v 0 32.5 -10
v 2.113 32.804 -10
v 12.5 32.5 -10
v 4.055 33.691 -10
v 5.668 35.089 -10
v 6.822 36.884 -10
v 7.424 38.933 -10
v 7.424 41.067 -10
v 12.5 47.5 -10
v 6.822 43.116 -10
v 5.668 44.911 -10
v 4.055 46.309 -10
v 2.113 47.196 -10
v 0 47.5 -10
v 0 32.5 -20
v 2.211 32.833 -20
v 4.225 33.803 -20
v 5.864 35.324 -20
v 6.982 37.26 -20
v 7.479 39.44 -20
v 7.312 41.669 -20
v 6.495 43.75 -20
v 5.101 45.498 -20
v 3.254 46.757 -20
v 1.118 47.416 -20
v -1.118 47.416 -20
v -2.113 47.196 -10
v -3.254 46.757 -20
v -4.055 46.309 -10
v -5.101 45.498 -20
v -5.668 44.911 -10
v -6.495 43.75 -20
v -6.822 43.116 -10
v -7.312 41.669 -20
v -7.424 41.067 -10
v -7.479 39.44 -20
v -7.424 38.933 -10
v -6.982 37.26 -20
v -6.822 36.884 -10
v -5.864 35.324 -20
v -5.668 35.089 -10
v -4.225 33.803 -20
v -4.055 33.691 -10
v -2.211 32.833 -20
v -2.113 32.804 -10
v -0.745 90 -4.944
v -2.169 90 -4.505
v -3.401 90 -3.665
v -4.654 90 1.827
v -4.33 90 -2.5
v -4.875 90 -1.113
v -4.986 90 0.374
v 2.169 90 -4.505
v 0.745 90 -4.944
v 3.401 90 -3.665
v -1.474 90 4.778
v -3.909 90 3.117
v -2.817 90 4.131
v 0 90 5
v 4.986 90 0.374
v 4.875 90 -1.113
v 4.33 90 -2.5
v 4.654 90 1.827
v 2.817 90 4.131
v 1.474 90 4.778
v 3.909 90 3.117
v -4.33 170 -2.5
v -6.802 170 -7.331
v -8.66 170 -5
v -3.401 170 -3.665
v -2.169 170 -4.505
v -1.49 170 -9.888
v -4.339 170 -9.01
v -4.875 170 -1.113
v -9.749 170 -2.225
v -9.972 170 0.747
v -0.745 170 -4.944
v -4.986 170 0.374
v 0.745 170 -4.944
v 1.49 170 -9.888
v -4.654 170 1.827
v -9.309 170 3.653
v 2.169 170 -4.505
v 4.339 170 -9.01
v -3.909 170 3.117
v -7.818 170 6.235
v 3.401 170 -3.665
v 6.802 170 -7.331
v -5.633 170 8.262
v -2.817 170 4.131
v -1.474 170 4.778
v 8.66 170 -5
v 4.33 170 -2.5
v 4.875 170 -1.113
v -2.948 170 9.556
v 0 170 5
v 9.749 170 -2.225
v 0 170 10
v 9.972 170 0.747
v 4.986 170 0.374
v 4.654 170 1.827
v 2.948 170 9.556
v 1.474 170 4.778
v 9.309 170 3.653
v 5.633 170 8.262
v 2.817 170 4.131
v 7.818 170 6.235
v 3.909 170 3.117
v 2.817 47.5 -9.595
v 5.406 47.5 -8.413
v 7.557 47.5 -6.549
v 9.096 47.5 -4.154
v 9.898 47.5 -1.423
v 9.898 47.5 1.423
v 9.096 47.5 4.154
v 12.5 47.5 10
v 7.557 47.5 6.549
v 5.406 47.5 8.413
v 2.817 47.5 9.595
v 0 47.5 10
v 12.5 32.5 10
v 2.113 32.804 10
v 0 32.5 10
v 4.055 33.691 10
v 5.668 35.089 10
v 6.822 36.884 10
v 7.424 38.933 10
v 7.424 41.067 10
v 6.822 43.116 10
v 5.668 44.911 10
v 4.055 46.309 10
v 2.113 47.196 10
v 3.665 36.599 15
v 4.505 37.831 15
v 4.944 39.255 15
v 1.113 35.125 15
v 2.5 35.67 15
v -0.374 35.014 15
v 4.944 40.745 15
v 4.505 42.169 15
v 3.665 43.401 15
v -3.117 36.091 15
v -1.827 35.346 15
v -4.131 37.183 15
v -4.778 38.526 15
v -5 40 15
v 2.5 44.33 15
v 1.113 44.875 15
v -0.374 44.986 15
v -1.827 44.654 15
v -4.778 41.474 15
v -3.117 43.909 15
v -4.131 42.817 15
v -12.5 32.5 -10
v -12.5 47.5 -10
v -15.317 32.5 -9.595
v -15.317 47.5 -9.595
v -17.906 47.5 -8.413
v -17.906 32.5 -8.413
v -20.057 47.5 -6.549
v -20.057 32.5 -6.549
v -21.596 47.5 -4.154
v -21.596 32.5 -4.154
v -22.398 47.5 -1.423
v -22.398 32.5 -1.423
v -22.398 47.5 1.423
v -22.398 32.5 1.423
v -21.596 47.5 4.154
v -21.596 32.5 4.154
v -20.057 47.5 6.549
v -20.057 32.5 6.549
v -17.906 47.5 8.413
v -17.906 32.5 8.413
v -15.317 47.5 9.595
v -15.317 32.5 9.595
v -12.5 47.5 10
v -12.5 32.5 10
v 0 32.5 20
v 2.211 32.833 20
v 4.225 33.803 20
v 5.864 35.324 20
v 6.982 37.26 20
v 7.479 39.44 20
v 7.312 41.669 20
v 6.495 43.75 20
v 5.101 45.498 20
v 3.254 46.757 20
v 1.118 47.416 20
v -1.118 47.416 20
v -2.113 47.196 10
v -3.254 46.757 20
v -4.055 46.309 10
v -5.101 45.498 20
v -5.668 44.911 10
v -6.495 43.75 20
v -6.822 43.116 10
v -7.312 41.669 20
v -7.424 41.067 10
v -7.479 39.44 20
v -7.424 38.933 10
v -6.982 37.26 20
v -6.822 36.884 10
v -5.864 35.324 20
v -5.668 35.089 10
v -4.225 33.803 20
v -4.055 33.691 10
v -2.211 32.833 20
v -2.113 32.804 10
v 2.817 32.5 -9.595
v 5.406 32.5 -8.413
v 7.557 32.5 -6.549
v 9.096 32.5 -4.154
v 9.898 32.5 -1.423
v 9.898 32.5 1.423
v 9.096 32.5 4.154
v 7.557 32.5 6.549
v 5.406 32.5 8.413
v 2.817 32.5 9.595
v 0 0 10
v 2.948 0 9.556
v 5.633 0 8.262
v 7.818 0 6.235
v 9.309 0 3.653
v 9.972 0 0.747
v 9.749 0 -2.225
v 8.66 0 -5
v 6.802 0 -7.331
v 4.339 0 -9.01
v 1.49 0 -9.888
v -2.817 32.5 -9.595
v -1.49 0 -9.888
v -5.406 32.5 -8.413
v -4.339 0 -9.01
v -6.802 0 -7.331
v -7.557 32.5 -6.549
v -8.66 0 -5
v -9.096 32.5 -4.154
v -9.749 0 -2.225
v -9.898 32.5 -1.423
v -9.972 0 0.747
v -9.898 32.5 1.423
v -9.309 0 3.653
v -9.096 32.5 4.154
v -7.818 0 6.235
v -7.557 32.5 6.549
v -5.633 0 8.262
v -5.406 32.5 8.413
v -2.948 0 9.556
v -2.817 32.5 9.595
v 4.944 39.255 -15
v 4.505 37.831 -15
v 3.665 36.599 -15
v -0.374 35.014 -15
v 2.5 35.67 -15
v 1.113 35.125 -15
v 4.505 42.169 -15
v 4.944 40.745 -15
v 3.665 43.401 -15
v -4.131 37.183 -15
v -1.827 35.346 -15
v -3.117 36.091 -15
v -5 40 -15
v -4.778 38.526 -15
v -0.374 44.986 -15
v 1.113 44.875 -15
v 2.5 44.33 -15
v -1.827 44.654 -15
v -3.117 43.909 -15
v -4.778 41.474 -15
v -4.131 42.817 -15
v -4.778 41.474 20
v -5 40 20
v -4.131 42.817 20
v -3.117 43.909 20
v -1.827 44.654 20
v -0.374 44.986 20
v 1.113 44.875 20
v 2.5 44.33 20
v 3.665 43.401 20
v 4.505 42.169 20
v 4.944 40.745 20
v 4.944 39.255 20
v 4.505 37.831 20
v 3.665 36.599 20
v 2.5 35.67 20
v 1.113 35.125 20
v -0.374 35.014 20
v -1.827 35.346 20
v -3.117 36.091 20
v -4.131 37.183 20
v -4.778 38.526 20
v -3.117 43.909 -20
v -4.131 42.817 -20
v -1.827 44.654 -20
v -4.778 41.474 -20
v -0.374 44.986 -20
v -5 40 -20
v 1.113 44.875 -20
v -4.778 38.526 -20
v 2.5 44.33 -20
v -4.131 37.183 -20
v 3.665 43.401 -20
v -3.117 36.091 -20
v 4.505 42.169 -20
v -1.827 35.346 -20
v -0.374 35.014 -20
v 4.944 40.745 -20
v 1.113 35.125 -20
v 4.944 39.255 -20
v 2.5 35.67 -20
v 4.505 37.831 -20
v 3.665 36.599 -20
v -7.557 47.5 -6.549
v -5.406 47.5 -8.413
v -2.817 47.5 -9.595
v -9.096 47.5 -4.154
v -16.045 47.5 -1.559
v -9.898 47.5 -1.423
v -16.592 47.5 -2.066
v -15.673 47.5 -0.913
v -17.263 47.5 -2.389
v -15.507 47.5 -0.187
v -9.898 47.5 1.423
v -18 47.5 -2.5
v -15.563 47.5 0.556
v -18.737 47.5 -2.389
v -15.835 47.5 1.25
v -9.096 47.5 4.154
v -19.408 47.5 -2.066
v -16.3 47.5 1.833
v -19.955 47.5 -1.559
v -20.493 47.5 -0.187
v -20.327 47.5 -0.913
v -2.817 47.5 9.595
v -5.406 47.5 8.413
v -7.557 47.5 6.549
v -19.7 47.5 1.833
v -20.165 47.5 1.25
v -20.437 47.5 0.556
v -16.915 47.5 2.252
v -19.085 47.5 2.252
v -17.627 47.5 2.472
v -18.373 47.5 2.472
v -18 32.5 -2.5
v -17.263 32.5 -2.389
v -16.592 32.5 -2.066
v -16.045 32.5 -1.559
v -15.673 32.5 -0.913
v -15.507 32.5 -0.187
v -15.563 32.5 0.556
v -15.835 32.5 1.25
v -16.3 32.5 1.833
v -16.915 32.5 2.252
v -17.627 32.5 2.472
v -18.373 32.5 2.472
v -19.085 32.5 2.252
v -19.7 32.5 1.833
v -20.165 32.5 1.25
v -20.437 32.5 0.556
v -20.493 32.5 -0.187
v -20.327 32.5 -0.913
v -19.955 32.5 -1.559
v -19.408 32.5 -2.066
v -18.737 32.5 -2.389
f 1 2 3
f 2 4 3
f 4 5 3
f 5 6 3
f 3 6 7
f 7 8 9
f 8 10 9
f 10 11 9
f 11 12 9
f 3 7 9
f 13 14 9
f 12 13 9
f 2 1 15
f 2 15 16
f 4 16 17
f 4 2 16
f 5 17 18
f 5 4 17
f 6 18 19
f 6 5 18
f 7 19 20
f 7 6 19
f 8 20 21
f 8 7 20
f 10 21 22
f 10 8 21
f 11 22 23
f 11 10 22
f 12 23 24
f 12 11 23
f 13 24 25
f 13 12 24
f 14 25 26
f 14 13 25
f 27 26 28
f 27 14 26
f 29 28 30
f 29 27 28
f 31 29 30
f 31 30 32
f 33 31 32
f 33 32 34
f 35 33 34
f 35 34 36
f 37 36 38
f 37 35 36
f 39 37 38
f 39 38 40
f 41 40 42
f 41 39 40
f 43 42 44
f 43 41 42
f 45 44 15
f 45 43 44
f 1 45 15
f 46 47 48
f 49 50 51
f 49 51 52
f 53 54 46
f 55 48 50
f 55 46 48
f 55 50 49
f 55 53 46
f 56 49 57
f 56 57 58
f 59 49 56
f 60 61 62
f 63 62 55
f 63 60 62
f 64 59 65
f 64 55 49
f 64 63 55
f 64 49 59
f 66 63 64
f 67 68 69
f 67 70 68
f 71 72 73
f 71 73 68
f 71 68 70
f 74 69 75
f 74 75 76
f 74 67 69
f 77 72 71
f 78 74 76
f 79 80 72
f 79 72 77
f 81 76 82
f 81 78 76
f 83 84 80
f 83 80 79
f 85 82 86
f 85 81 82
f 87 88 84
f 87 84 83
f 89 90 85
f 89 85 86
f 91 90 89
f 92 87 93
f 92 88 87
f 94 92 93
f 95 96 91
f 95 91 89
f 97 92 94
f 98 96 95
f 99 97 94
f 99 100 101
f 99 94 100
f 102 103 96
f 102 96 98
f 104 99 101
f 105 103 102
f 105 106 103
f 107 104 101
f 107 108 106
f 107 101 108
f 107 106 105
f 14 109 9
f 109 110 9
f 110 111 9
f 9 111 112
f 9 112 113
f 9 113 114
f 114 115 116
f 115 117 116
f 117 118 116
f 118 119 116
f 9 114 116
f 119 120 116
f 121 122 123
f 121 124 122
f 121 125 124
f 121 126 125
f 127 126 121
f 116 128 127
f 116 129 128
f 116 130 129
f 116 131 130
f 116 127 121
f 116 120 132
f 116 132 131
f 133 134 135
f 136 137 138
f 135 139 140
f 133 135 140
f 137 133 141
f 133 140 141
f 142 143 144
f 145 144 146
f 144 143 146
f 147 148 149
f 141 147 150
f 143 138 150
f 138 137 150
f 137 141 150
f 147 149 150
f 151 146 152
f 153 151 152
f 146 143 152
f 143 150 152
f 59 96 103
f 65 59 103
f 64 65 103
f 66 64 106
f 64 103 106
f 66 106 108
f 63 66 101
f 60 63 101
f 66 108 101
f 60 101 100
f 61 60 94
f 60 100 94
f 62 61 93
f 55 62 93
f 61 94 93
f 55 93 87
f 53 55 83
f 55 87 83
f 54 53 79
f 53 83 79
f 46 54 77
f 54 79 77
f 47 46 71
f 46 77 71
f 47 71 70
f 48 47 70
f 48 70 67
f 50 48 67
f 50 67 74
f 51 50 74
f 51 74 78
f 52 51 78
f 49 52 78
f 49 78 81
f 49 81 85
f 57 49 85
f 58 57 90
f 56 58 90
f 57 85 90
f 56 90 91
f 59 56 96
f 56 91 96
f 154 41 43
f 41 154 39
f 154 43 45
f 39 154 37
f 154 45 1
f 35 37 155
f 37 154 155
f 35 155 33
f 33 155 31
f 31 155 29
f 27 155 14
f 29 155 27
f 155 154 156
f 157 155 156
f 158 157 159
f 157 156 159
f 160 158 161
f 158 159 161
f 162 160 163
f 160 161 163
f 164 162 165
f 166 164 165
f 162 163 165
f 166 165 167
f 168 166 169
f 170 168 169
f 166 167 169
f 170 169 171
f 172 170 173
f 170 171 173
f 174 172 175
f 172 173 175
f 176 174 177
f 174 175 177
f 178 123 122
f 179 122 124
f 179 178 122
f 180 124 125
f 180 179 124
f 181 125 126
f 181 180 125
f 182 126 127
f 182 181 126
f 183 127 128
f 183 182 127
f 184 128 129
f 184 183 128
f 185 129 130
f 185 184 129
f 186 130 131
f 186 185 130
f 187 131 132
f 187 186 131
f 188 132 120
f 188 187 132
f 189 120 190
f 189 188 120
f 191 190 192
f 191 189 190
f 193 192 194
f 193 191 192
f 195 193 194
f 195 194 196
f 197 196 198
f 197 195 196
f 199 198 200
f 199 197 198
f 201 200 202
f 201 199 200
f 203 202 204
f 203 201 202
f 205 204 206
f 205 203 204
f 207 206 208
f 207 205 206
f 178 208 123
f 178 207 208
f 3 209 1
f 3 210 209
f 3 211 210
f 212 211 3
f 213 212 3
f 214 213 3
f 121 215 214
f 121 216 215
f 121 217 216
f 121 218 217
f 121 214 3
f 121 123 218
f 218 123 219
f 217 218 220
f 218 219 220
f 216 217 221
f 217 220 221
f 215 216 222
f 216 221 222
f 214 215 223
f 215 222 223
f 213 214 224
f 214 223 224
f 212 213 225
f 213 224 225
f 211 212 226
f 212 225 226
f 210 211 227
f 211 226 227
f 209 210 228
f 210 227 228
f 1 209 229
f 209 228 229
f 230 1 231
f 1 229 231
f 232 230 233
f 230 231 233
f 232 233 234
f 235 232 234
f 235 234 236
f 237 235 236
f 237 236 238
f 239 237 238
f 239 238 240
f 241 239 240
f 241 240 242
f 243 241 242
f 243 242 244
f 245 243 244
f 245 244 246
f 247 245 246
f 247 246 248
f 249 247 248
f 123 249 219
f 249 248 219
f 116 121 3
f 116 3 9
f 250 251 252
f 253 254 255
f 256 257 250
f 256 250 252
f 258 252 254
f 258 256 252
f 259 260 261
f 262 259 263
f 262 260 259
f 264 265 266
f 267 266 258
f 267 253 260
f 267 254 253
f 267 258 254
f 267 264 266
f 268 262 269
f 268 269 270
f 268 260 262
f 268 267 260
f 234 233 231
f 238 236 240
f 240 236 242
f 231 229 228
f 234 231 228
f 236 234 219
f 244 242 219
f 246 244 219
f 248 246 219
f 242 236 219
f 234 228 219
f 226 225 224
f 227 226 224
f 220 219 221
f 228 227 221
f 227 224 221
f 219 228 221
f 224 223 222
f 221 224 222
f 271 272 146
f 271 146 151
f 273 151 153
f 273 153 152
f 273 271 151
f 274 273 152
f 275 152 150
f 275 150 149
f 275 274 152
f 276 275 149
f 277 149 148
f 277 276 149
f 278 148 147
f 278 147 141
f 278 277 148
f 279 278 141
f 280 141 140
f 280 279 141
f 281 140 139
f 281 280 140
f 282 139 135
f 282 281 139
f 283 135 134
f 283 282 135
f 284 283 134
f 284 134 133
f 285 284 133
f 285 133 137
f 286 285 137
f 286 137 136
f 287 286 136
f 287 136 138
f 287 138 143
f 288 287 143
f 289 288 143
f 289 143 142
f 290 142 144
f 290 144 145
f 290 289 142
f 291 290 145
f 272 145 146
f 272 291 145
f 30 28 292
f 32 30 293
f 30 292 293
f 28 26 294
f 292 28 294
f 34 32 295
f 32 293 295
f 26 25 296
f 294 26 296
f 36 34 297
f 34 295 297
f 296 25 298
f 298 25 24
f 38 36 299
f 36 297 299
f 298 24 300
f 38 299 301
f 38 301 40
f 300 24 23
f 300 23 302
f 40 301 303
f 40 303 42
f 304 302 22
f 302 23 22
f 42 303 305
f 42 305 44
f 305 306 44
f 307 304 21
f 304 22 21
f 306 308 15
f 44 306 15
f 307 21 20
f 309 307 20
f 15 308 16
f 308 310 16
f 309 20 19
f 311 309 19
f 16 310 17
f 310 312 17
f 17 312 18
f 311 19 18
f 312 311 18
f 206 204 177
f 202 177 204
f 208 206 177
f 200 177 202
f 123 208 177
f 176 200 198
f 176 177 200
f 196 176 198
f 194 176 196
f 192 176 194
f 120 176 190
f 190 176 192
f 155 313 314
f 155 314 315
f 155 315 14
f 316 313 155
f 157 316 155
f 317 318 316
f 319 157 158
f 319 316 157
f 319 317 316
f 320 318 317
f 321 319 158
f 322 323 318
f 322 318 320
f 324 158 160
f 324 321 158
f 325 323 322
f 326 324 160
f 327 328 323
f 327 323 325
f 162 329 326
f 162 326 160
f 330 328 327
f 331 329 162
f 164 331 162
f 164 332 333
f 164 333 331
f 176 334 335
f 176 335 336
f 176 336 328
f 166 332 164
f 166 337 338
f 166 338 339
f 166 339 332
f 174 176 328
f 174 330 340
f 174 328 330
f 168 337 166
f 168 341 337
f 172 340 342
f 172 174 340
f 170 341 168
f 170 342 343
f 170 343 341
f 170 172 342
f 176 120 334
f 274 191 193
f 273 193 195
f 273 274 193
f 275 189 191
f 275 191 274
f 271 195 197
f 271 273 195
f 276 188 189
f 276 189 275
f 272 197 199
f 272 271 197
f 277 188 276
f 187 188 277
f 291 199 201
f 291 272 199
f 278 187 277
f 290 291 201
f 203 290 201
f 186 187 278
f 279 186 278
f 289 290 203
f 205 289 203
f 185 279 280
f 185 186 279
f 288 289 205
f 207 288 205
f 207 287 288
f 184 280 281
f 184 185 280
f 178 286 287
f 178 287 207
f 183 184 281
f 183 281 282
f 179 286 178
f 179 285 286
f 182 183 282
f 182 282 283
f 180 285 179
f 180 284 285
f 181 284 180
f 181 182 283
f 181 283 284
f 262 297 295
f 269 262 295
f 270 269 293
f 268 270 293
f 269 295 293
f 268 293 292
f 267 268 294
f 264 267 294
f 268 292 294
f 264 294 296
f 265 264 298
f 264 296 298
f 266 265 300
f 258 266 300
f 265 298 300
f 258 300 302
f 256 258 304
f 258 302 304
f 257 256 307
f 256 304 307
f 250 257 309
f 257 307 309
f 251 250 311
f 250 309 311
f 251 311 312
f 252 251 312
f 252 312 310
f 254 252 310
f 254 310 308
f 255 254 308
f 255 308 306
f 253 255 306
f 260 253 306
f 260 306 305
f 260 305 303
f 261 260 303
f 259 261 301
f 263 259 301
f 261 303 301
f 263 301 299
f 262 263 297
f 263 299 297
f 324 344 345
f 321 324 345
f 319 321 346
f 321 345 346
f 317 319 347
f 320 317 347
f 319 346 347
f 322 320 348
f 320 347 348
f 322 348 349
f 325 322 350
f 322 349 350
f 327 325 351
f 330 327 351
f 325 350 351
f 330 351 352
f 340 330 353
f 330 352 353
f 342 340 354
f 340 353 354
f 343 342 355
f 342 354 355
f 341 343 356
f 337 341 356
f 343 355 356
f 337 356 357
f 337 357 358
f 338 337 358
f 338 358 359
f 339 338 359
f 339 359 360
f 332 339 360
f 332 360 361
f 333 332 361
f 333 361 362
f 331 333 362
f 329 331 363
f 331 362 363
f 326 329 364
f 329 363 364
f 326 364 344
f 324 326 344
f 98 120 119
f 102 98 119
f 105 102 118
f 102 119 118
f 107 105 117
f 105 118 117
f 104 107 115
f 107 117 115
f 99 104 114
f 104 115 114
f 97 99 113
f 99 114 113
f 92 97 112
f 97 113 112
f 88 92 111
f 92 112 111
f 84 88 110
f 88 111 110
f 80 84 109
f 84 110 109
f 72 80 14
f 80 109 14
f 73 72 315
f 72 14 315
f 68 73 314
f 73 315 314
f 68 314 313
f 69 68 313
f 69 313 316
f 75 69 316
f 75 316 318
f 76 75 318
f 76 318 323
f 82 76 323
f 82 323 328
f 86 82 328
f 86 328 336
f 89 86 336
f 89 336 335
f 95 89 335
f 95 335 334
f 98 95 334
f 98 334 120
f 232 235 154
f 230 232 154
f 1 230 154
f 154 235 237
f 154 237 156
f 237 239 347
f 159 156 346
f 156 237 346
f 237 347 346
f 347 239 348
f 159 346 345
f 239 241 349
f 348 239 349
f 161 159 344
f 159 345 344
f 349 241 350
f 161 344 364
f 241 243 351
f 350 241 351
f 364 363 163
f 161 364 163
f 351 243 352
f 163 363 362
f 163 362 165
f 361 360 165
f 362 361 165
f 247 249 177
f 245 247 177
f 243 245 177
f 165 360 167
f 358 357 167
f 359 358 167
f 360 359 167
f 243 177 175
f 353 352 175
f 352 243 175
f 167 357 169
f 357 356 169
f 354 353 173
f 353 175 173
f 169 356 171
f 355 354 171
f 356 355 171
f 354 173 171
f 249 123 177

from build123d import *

# Parameters (mm, degrees)
SKETCH1_R           = 10
BOSS_EXTRUDE1_DEPTH = 170
SKETCH2_W           = 25
SKETCH2_H           = 15
BOSS_EXTRUDE3_DEPTH = 10
BOSS_EXTRUDE4_START = -10
SKETCH3_R           = 7.5
BOSS_EXTRUDE4_DEPTH = 20
SKETCH4_R           = 5
CUT_EXTRUDE1_DEPTH  = 80
SKETCH5_R           = 5
CUT_EXTRUDE2_DEPTH  = 5
BOSS_EXTRUDE5_DEPTH = 15
SKETCH7_R           = 2.5
CUT_EXTRUDE3_DEPTH  = 15


with BuildPart() as part:
    # Sketch1 → Boss-Extrude1 (new body)
    with BuildSketch(Plane(origin=(0, 0, 0), x_dir=(1, 0, 0), z_dir=(0, 1, 0))):
        with Locations(Location((0, 0, 0), (0, 0, 270))):
            Circle(SKETCH1_R)
    extrude(amount=BOSS_EXTRUDE1_DEPTH)

    # Sketch2 → Boss-Extrude3 (add, symmetric)
    with BuildSketch(Plane.XY):
        with Locations((0, 40)):
            Rectangle(SKETCH2_W, SKETCH2_H)
    extrude(amount=BOSS_EXTRUDE3_DEPTH, both=True)

    # Sketch3 → Boss-Extrude4 (add, symmetric)
    with BuildSketch(Plane.XY.offset(10).offset(BOSS_EXTRUDE4_START)):
        with Locations(Location((0, 40, 0), (0, 0, 270))):
            Circle(SKETCH3_R)
    extrude(amount=BOSS_EXTRUDE4_DEPTH, both=True)

    # Sketch4 → Cut-Extrude1 (cut)
    with BuildSketch(Plane(origin=(0, 170, 0), x_dir=(1, 0, 0), z_dir=(0, 1, 0))):
        with Locations(Location((0, 0, 0), (0, 0, 270))):
            Circle(SKETCH4_R)
    extrude(amount=-CUT_EXTRUDE1_DEPTH, mode=Mode.SUBTRACT)

    # Sketch5 → Cut-Extrude2 (cut)
    with BuildSketch(Plane(origin=(0, 0, -20), x_dir=(-1, 0, 0), z_dir=(0, 0, -1))):
        with Locations((0, 40)):
            Circle(SKETCH5_R)
    cut_extrude2 = extrude(amount=-CUT_EXTRUDE2_DEPTH, mode=Mode.SUBTRACT)

    # Mirror1: Cut-Extrude2 across plane
    add(cut_extrude2.mirror(Plane.XY), mode=Mode.SUBTRACT)

    # Sketch6 → Boss-Extrude5 (add)
    with BuildSketch(Plane.XZ.offset(-32.5)):
        with BuildLine():
            Line((-12.5, 10), (-12.5, -10))
            ThreePointArc((-12.5, -10), (-22.5, 0), (-12.5, 10))
        make_face()
    extrude(amount=-BOSS_EXTRUDE5_DEPTH)

    # Sketch7 → Cut-Extrude3 (cut)
    with BuildSketch(Plane.XZ.offset(-32.5)):
        with Locations(Location((-18, 0, 0), (0, 0, 270))):
            Circle(SKETCH7_R)
    extrude(amount=-CUT_EXTRUDE3_DEPTH, mode=Mode.SUBTRACT)


solid = part.part
